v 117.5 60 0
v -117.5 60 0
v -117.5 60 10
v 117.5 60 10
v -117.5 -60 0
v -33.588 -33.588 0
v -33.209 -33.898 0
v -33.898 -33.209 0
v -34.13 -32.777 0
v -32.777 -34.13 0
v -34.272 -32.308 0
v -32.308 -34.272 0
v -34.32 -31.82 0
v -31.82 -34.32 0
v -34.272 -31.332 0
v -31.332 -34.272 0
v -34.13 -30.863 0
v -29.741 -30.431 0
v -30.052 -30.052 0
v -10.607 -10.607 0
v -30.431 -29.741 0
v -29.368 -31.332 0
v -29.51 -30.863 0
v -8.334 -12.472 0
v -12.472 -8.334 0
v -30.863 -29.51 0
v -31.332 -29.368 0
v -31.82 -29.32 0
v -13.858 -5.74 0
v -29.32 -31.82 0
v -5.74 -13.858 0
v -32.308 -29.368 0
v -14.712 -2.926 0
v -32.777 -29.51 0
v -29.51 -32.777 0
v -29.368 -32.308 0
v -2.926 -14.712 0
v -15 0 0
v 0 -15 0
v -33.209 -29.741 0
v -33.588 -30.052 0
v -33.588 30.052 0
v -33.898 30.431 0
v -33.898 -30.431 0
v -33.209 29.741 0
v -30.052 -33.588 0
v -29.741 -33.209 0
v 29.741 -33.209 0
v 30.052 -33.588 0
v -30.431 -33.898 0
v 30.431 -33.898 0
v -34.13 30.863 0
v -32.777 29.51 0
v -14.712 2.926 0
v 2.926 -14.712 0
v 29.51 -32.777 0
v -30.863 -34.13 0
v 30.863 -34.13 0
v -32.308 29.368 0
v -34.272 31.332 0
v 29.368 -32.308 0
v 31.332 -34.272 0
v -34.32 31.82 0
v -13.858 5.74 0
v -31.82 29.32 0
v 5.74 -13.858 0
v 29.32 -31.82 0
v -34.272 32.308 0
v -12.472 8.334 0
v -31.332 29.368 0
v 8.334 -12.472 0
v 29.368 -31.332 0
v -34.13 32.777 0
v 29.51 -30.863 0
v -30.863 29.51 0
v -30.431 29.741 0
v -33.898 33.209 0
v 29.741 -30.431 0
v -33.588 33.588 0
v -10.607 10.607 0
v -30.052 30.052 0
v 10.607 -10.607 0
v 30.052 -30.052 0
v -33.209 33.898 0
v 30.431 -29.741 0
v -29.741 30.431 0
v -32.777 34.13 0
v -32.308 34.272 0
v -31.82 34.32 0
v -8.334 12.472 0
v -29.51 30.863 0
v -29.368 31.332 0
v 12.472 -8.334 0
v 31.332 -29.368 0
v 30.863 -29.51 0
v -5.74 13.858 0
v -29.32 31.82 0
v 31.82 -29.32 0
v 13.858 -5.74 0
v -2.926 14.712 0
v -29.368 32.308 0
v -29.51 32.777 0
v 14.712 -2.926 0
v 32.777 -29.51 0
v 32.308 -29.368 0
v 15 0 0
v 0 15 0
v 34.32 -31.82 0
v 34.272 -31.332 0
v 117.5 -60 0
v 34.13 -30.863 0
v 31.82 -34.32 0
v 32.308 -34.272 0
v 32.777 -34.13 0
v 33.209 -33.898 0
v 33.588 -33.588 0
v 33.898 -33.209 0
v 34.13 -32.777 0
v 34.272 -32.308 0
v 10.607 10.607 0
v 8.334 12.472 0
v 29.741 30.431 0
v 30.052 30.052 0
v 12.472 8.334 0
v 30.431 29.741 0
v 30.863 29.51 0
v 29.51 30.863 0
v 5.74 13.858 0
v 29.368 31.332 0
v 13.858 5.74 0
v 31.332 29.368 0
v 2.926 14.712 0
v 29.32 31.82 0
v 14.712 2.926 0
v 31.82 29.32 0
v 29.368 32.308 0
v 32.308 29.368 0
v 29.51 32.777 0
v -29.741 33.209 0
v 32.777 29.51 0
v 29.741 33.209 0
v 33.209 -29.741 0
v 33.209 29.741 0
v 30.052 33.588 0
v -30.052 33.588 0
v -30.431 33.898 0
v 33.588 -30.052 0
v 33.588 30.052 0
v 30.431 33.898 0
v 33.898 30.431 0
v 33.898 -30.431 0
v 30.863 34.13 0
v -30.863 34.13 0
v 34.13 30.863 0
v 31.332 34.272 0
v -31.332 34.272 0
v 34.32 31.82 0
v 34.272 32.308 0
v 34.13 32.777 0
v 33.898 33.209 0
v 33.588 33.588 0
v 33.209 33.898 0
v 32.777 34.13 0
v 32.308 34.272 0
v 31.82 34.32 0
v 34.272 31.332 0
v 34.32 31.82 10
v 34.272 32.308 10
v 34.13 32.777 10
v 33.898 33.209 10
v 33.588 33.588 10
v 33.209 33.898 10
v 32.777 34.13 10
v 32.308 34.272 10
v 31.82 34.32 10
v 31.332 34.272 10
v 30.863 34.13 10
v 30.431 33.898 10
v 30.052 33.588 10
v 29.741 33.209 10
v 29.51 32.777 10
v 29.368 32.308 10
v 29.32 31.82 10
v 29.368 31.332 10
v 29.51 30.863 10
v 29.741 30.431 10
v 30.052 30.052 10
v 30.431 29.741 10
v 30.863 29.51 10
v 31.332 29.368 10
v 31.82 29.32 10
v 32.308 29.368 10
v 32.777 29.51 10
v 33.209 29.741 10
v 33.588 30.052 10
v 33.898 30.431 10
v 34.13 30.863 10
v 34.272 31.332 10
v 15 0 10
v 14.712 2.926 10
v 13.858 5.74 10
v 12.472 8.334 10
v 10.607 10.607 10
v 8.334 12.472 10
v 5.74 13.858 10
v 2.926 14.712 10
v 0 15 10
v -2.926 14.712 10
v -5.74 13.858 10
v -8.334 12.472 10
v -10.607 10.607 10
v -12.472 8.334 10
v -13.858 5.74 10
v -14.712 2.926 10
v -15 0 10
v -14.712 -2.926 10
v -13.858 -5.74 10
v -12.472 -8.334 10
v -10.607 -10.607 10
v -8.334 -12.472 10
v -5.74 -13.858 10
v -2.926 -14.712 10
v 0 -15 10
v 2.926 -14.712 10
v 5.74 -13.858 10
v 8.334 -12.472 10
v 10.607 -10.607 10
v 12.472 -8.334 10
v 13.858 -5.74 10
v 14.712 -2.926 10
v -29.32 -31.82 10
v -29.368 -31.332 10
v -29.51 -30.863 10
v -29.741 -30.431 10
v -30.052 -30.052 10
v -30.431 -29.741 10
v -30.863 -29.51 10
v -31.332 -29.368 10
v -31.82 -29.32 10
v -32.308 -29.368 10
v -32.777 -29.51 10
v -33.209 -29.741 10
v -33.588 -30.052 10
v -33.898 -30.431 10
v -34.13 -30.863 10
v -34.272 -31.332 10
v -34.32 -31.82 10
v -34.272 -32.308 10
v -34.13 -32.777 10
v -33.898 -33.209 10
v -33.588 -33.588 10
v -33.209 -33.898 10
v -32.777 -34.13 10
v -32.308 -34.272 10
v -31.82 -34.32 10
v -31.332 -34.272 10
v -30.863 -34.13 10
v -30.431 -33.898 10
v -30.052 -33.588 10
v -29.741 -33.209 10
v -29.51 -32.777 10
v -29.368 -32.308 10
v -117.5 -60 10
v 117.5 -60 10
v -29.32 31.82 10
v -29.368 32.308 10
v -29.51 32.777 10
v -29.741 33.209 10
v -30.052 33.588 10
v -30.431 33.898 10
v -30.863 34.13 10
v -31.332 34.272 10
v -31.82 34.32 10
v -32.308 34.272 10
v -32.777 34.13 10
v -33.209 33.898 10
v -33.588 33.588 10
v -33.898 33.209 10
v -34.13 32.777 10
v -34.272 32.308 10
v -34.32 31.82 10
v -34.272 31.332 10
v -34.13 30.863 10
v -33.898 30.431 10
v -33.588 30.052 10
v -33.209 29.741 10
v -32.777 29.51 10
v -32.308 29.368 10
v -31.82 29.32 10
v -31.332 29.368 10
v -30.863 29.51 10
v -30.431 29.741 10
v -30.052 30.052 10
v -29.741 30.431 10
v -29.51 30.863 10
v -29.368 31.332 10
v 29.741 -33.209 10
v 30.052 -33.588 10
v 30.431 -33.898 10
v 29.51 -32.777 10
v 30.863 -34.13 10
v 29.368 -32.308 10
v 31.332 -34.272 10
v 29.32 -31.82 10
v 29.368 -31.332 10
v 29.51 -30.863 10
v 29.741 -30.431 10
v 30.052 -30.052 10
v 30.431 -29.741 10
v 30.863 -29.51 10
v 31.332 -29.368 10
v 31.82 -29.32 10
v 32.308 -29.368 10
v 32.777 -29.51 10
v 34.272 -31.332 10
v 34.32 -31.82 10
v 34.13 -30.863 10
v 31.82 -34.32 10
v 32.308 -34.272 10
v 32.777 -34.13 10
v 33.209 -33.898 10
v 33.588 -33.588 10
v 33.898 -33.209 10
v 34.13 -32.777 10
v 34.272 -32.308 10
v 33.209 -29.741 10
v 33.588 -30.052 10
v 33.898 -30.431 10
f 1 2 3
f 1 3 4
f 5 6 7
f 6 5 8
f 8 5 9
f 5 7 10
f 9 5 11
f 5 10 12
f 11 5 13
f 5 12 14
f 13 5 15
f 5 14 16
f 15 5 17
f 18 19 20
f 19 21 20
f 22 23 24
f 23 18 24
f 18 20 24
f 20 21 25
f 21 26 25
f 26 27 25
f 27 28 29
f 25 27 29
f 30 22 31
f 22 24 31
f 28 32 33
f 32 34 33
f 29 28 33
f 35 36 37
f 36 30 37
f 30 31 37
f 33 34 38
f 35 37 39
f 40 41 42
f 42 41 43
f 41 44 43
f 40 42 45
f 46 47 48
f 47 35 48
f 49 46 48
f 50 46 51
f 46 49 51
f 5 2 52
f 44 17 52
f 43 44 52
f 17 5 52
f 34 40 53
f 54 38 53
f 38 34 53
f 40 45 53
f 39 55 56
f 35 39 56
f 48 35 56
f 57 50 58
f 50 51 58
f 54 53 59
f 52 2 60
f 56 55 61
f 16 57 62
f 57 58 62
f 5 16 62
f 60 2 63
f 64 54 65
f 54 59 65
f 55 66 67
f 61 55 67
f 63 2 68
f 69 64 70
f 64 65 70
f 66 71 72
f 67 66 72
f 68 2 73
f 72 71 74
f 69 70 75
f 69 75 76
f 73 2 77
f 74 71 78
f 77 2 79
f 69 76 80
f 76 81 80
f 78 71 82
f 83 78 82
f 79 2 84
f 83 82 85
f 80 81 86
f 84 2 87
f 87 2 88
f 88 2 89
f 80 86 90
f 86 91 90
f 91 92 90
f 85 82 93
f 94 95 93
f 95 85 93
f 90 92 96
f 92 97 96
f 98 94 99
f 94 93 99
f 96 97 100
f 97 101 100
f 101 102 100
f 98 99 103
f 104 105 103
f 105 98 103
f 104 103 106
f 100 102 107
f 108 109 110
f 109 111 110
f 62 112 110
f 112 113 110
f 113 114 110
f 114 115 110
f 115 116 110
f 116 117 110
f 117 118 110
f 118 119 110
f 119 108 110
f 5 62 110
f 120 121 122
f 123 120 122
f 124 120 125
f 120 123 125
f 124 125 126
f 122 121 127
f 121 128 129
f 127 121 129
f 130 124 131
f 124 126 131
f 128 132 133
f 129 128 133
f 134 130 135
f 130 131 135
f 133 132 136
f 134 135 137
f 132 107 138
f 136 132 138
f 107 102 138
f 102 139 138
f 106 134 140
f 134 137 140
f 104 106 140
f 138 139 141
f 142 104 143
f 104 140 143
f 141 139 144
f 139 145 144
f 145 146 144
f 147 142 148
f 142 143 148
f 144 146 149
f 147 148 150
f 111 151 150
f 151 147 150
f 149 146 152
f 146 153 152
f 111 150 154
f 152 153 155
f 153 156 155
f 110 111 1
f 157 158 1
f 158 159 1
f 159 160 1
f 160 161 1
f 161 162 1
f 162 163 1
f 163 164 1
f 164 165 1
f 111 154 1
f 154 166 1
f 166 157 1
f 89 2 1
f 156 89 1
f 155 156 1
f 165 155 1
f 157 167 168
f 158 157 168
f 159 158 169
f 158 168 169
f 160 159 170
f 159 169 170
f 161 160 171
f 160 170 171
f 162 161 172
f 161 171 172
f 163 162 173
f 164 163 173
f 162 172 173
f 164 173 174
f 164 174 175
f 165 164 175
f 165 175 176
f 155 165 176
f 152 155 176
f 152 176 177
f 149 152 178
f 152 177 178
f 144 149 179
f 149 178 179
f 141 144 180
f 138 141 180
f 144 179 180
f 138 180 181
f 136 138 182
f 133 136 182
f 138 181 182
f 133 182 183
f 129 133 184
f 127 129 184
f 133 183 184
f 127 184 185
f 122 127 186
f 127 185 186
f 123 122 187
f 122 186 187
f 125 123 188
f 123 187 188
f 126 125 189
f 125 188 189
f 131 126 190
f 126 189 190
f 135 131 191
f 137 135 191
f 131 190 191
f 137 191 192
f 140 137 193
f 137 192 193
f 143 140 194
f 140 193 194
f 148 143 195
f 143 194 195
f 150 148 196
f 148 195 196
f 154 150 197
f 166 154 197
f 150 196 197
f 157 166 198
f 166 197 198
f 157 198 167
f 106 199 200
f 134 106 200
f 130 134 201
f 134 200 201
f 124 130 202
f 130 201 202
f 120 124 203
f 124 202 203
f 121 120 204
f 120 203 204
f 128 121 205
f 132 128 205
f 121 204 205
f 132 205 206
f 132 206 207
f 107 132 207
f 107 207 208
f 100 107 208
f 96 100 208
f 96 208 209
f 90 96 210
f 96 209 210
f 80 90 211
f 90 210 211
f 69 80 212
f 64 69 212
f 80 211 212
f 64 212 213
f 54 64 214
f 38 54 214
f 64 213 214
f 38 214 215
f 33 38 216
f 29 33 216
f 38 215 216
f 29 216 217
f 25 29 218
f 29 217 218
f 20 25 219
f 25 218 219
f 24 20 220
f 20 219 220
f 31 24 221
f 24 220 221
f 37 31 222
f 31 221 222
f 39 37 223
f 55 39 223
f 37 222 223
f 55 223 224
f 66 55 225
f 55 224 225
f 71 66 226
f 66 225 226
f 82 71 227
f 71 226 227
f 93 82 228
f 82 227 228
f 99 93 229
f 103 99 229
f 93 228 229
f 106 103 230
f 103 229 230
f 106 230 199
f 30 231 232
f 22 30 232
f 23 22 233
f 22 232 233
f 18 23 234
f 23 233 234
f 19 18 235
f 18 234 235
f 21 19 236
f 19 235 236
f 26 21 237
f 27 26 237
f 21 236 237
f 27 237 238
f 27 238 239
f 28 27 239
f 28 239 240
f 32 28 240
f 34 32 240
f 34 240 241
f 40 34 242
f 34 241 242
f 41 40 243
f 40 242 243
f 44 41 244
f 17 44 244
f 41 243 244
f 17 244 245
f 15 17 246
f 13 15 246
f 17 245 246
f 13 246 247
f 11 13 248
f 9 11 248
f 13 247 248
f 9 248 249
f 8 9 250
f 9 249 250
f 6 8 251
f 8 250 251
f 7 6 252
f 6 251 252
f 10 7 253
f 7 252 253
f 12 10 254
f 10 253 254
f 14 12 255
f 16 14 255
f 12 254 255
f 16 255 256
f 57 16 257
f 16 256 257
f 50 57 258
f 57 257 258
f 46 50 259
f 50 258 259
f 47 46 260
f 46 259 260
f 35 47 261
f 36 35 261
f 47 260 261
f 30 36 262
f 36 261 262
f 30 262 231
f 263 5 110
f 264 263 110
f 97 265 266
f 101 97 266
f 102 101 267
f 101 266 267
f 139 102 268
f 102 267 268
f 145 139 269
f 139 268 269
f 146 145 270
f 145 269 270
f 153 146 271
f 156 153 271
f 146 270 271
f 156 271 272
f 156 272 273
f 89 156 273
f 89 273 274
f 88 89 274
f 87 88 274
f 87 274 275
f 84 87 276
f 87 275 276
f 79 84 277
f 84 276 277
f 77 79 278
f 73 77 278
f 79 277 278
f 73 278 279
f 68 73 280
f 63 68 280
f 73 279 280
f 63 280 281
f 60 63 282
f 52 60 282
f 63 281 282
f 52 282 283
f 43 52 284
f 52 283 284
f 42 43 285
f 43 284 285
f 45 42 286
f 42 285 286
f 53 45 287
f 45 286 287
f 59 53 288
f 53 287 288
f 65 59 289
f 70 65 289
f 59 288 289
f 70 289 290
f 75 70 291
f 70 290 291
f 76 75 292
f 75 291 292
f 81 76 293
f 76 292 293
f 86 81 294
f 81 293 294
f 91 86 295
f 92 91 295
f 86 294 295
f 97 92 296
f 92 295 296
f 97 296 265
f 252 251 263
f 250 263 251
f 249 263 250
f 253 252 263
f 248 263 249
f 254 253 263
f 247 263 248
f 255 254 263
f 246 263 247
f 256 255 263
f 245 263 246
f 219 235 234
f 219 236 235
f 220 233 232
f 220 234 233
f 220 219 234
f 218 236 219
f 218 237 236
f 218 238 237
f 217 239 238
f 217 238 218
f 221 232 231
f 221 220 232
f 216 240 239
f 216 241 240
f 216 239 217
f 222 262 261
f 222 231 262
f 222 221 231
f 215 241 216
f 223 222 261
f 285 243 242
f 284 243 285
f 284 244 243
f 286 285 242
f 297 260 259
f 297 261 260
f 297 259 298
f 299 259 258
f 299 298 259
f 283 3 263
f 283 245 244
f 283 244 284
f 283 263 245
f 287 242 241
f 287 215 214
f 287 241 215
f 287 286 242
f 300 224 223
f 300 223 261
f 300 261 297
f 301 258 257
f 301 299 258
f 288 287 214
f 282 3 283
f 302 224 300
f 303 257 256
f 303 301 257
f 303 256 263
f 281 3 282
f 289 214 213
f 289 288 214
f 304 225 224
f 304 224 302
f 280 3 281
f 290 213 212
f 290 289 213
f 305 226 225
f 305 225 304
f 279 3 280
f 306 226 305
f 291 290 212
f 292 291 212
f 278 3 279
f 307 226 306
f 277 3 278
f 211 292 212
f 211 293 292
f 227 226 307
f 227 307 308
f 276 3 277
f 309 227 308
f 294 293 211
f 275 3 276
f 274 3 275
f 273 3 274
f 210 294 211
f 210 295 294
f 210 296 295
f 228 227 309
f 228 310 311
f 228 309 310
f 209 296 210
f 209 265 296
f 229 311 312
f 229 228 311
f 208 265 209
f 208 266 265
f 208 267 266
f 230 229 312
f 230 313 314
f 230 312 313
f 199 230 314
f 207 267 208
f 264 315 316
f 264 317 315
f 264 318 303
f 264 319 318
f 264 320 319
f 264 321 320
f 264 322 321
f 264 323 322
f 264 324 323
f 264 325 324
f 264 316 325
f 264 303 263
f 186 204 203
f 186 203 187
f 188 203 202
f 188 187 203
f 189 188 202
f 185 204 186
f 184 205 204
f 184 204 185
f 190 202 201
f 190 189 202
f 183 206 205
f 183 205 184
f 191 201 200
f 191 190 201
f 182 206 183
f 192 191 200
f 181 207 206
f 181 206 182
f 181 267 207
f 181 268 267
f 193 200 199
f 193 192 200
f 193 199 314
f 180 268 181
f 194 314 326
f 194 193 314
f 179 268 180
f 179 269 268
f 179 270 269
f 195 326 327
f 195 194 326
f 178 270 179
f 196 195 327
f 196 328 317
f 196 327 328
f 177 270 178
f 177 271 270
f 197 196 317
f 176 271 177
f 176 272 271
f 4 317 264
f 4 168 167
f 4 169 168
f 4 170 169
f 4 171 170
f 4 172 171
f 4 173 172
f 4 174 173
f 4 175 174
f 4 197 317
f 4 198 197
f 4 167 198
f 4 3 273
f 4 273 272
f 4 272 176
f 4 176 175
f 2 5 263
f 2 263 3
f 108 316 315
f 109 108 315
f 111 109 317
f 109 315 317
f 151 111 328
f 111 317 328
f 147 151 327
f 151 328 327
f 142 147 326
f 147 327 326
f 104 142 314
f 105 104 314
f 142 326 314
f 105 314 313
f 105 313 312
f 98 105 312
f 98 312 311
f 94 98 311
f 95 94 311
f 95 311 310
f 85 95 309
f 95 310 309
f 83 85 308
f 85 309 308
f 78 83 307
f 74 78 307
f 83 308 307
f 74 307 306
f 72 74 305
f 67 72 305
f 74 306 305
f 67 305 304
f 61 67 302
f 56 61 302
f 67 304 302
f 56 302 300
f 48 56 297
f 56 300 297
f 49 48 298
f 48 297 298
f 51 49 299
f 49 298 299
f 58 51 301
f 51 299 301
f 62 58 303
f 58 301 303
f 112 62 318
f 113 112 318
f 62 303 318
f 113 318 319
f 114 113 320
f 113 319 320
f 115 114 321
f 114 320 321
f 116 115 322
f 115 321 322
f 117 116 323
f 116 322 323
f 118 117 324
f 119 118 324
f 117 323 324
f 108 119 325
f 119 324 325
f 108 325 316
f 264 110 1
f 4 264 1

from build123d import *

# Parameters (mm, degrees)
SKETCH1_W           = 235
SKETCH1_H           = 120
BOSS_EXTRUDE1_DEPTH = 10
SKETCH2_R           = 15
CUT_EXTRUDE1_DEPTH  = 10
SKETCH3_R           = 2.5
CUT_EXTRUDE2_DEPTH  = 10


with BuildPart() as part:
    # Sketch1 → Boss-Extrude1 (new body)
    with BuildSketch(Plane.XY):
        Rectangle(SKETCH1_W, SKETCH1_H)
    extrude(amount=BOSS_EXTRUDE1_DEPTH)

    # Sketch2 → Cut-Extrude1 (cut)
    with BuildSketch(Plane.XY.offset(10)):
        Circle(SKETCH2_R)
    extrude(amount=-CUT_EXTRUDE1_DEPTH, mode=Mode.SUBTRACT)

    # Sketch3 → Cut-Extrude2 (cut)
    with BuildSketch(Plane.XY.offset(10)):
        with Locations((31.819805153, 31.819805153)):
            Circle(SKETCH3_R)
        with Locations((31.819805153, -31.819805153)):
            Circle(SKETCH3_R)
        with Locations((-31.819805153, -31.819805153)):
            Circle(SKETCH3_R)
        with Locations((-31.819805153, 31.819805153)):
            Circle(SKETCH3_R)
    extrude(amount=-CUT_EXTRUDE2_DEPTH, mode=Mode.SUBTRACT)


solid = part.part
